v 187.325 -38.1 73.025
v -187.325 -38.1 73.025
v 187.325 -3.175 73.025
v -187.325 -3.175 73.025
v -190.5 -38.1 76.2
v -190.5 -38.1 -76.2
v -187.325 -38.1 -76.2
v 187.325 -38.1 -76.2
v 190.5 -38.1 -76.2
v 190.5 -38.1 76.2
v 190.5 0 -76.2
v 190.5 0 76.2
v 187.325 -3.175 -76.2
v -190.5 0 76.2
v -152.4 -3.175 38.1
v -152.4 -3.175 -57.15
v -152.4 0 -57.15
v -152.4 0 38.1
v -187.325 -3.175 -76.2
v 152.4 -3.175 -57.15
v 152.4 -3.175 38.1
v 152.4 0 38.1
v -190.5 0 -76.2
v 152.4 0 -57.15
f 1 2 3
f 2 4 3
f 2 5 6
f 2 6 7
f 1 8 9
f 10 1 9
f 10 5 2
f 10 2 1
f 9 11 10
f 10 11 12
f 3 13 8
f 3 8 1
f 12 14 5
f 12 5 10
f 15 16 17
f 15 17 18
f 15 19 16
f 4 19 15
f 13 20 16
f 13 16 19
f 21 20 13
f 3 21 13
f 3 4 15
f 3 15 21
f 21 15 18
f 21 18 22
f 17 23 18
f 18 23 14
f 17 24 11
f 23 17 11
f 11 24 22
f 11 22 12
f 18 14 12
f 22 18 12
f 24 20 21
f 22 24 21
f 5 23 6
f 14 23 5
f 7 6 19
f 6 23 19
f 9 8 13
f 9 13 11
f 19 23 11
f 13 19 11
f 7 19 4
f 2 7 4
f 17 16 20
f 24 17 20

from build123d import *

# Parameters (mm, degrees)
F0_W     = 381
F0_H     = 152.4
F1_DEPTH = 38.1
F2_T     = -3.175
F3_W     = 304.8
F3_H     = 95.25
F4_DEPTH = 25.4


with BuildPart() as f1:
    # F0 (on Front) → F1 (new body)
    with BuildSketch(Plane.XZ):
        Rectangle(F0_W, F0_H)
    extrude(amount=F1_DEPTH)

    # F2
    f2_openings = [f1.faces().sort_by_distance(p)[0] for p in [
        (0, -38.1, 0),
        (0, -19.05, -76.2),
    ]]
    offset(amount=F2_T, openings=f2_openings)

    # F3 (on face) → F4 (cut)
    with BuildSketch(Plane.XZ.offset(3.175)):
        with Locations((0, -9.525)):
            Rectangle(F3_W, F3_H)
    extrude(amount=-F4_DEPTH, mode=Mode.SUBTRACT)


solid = f1.part
